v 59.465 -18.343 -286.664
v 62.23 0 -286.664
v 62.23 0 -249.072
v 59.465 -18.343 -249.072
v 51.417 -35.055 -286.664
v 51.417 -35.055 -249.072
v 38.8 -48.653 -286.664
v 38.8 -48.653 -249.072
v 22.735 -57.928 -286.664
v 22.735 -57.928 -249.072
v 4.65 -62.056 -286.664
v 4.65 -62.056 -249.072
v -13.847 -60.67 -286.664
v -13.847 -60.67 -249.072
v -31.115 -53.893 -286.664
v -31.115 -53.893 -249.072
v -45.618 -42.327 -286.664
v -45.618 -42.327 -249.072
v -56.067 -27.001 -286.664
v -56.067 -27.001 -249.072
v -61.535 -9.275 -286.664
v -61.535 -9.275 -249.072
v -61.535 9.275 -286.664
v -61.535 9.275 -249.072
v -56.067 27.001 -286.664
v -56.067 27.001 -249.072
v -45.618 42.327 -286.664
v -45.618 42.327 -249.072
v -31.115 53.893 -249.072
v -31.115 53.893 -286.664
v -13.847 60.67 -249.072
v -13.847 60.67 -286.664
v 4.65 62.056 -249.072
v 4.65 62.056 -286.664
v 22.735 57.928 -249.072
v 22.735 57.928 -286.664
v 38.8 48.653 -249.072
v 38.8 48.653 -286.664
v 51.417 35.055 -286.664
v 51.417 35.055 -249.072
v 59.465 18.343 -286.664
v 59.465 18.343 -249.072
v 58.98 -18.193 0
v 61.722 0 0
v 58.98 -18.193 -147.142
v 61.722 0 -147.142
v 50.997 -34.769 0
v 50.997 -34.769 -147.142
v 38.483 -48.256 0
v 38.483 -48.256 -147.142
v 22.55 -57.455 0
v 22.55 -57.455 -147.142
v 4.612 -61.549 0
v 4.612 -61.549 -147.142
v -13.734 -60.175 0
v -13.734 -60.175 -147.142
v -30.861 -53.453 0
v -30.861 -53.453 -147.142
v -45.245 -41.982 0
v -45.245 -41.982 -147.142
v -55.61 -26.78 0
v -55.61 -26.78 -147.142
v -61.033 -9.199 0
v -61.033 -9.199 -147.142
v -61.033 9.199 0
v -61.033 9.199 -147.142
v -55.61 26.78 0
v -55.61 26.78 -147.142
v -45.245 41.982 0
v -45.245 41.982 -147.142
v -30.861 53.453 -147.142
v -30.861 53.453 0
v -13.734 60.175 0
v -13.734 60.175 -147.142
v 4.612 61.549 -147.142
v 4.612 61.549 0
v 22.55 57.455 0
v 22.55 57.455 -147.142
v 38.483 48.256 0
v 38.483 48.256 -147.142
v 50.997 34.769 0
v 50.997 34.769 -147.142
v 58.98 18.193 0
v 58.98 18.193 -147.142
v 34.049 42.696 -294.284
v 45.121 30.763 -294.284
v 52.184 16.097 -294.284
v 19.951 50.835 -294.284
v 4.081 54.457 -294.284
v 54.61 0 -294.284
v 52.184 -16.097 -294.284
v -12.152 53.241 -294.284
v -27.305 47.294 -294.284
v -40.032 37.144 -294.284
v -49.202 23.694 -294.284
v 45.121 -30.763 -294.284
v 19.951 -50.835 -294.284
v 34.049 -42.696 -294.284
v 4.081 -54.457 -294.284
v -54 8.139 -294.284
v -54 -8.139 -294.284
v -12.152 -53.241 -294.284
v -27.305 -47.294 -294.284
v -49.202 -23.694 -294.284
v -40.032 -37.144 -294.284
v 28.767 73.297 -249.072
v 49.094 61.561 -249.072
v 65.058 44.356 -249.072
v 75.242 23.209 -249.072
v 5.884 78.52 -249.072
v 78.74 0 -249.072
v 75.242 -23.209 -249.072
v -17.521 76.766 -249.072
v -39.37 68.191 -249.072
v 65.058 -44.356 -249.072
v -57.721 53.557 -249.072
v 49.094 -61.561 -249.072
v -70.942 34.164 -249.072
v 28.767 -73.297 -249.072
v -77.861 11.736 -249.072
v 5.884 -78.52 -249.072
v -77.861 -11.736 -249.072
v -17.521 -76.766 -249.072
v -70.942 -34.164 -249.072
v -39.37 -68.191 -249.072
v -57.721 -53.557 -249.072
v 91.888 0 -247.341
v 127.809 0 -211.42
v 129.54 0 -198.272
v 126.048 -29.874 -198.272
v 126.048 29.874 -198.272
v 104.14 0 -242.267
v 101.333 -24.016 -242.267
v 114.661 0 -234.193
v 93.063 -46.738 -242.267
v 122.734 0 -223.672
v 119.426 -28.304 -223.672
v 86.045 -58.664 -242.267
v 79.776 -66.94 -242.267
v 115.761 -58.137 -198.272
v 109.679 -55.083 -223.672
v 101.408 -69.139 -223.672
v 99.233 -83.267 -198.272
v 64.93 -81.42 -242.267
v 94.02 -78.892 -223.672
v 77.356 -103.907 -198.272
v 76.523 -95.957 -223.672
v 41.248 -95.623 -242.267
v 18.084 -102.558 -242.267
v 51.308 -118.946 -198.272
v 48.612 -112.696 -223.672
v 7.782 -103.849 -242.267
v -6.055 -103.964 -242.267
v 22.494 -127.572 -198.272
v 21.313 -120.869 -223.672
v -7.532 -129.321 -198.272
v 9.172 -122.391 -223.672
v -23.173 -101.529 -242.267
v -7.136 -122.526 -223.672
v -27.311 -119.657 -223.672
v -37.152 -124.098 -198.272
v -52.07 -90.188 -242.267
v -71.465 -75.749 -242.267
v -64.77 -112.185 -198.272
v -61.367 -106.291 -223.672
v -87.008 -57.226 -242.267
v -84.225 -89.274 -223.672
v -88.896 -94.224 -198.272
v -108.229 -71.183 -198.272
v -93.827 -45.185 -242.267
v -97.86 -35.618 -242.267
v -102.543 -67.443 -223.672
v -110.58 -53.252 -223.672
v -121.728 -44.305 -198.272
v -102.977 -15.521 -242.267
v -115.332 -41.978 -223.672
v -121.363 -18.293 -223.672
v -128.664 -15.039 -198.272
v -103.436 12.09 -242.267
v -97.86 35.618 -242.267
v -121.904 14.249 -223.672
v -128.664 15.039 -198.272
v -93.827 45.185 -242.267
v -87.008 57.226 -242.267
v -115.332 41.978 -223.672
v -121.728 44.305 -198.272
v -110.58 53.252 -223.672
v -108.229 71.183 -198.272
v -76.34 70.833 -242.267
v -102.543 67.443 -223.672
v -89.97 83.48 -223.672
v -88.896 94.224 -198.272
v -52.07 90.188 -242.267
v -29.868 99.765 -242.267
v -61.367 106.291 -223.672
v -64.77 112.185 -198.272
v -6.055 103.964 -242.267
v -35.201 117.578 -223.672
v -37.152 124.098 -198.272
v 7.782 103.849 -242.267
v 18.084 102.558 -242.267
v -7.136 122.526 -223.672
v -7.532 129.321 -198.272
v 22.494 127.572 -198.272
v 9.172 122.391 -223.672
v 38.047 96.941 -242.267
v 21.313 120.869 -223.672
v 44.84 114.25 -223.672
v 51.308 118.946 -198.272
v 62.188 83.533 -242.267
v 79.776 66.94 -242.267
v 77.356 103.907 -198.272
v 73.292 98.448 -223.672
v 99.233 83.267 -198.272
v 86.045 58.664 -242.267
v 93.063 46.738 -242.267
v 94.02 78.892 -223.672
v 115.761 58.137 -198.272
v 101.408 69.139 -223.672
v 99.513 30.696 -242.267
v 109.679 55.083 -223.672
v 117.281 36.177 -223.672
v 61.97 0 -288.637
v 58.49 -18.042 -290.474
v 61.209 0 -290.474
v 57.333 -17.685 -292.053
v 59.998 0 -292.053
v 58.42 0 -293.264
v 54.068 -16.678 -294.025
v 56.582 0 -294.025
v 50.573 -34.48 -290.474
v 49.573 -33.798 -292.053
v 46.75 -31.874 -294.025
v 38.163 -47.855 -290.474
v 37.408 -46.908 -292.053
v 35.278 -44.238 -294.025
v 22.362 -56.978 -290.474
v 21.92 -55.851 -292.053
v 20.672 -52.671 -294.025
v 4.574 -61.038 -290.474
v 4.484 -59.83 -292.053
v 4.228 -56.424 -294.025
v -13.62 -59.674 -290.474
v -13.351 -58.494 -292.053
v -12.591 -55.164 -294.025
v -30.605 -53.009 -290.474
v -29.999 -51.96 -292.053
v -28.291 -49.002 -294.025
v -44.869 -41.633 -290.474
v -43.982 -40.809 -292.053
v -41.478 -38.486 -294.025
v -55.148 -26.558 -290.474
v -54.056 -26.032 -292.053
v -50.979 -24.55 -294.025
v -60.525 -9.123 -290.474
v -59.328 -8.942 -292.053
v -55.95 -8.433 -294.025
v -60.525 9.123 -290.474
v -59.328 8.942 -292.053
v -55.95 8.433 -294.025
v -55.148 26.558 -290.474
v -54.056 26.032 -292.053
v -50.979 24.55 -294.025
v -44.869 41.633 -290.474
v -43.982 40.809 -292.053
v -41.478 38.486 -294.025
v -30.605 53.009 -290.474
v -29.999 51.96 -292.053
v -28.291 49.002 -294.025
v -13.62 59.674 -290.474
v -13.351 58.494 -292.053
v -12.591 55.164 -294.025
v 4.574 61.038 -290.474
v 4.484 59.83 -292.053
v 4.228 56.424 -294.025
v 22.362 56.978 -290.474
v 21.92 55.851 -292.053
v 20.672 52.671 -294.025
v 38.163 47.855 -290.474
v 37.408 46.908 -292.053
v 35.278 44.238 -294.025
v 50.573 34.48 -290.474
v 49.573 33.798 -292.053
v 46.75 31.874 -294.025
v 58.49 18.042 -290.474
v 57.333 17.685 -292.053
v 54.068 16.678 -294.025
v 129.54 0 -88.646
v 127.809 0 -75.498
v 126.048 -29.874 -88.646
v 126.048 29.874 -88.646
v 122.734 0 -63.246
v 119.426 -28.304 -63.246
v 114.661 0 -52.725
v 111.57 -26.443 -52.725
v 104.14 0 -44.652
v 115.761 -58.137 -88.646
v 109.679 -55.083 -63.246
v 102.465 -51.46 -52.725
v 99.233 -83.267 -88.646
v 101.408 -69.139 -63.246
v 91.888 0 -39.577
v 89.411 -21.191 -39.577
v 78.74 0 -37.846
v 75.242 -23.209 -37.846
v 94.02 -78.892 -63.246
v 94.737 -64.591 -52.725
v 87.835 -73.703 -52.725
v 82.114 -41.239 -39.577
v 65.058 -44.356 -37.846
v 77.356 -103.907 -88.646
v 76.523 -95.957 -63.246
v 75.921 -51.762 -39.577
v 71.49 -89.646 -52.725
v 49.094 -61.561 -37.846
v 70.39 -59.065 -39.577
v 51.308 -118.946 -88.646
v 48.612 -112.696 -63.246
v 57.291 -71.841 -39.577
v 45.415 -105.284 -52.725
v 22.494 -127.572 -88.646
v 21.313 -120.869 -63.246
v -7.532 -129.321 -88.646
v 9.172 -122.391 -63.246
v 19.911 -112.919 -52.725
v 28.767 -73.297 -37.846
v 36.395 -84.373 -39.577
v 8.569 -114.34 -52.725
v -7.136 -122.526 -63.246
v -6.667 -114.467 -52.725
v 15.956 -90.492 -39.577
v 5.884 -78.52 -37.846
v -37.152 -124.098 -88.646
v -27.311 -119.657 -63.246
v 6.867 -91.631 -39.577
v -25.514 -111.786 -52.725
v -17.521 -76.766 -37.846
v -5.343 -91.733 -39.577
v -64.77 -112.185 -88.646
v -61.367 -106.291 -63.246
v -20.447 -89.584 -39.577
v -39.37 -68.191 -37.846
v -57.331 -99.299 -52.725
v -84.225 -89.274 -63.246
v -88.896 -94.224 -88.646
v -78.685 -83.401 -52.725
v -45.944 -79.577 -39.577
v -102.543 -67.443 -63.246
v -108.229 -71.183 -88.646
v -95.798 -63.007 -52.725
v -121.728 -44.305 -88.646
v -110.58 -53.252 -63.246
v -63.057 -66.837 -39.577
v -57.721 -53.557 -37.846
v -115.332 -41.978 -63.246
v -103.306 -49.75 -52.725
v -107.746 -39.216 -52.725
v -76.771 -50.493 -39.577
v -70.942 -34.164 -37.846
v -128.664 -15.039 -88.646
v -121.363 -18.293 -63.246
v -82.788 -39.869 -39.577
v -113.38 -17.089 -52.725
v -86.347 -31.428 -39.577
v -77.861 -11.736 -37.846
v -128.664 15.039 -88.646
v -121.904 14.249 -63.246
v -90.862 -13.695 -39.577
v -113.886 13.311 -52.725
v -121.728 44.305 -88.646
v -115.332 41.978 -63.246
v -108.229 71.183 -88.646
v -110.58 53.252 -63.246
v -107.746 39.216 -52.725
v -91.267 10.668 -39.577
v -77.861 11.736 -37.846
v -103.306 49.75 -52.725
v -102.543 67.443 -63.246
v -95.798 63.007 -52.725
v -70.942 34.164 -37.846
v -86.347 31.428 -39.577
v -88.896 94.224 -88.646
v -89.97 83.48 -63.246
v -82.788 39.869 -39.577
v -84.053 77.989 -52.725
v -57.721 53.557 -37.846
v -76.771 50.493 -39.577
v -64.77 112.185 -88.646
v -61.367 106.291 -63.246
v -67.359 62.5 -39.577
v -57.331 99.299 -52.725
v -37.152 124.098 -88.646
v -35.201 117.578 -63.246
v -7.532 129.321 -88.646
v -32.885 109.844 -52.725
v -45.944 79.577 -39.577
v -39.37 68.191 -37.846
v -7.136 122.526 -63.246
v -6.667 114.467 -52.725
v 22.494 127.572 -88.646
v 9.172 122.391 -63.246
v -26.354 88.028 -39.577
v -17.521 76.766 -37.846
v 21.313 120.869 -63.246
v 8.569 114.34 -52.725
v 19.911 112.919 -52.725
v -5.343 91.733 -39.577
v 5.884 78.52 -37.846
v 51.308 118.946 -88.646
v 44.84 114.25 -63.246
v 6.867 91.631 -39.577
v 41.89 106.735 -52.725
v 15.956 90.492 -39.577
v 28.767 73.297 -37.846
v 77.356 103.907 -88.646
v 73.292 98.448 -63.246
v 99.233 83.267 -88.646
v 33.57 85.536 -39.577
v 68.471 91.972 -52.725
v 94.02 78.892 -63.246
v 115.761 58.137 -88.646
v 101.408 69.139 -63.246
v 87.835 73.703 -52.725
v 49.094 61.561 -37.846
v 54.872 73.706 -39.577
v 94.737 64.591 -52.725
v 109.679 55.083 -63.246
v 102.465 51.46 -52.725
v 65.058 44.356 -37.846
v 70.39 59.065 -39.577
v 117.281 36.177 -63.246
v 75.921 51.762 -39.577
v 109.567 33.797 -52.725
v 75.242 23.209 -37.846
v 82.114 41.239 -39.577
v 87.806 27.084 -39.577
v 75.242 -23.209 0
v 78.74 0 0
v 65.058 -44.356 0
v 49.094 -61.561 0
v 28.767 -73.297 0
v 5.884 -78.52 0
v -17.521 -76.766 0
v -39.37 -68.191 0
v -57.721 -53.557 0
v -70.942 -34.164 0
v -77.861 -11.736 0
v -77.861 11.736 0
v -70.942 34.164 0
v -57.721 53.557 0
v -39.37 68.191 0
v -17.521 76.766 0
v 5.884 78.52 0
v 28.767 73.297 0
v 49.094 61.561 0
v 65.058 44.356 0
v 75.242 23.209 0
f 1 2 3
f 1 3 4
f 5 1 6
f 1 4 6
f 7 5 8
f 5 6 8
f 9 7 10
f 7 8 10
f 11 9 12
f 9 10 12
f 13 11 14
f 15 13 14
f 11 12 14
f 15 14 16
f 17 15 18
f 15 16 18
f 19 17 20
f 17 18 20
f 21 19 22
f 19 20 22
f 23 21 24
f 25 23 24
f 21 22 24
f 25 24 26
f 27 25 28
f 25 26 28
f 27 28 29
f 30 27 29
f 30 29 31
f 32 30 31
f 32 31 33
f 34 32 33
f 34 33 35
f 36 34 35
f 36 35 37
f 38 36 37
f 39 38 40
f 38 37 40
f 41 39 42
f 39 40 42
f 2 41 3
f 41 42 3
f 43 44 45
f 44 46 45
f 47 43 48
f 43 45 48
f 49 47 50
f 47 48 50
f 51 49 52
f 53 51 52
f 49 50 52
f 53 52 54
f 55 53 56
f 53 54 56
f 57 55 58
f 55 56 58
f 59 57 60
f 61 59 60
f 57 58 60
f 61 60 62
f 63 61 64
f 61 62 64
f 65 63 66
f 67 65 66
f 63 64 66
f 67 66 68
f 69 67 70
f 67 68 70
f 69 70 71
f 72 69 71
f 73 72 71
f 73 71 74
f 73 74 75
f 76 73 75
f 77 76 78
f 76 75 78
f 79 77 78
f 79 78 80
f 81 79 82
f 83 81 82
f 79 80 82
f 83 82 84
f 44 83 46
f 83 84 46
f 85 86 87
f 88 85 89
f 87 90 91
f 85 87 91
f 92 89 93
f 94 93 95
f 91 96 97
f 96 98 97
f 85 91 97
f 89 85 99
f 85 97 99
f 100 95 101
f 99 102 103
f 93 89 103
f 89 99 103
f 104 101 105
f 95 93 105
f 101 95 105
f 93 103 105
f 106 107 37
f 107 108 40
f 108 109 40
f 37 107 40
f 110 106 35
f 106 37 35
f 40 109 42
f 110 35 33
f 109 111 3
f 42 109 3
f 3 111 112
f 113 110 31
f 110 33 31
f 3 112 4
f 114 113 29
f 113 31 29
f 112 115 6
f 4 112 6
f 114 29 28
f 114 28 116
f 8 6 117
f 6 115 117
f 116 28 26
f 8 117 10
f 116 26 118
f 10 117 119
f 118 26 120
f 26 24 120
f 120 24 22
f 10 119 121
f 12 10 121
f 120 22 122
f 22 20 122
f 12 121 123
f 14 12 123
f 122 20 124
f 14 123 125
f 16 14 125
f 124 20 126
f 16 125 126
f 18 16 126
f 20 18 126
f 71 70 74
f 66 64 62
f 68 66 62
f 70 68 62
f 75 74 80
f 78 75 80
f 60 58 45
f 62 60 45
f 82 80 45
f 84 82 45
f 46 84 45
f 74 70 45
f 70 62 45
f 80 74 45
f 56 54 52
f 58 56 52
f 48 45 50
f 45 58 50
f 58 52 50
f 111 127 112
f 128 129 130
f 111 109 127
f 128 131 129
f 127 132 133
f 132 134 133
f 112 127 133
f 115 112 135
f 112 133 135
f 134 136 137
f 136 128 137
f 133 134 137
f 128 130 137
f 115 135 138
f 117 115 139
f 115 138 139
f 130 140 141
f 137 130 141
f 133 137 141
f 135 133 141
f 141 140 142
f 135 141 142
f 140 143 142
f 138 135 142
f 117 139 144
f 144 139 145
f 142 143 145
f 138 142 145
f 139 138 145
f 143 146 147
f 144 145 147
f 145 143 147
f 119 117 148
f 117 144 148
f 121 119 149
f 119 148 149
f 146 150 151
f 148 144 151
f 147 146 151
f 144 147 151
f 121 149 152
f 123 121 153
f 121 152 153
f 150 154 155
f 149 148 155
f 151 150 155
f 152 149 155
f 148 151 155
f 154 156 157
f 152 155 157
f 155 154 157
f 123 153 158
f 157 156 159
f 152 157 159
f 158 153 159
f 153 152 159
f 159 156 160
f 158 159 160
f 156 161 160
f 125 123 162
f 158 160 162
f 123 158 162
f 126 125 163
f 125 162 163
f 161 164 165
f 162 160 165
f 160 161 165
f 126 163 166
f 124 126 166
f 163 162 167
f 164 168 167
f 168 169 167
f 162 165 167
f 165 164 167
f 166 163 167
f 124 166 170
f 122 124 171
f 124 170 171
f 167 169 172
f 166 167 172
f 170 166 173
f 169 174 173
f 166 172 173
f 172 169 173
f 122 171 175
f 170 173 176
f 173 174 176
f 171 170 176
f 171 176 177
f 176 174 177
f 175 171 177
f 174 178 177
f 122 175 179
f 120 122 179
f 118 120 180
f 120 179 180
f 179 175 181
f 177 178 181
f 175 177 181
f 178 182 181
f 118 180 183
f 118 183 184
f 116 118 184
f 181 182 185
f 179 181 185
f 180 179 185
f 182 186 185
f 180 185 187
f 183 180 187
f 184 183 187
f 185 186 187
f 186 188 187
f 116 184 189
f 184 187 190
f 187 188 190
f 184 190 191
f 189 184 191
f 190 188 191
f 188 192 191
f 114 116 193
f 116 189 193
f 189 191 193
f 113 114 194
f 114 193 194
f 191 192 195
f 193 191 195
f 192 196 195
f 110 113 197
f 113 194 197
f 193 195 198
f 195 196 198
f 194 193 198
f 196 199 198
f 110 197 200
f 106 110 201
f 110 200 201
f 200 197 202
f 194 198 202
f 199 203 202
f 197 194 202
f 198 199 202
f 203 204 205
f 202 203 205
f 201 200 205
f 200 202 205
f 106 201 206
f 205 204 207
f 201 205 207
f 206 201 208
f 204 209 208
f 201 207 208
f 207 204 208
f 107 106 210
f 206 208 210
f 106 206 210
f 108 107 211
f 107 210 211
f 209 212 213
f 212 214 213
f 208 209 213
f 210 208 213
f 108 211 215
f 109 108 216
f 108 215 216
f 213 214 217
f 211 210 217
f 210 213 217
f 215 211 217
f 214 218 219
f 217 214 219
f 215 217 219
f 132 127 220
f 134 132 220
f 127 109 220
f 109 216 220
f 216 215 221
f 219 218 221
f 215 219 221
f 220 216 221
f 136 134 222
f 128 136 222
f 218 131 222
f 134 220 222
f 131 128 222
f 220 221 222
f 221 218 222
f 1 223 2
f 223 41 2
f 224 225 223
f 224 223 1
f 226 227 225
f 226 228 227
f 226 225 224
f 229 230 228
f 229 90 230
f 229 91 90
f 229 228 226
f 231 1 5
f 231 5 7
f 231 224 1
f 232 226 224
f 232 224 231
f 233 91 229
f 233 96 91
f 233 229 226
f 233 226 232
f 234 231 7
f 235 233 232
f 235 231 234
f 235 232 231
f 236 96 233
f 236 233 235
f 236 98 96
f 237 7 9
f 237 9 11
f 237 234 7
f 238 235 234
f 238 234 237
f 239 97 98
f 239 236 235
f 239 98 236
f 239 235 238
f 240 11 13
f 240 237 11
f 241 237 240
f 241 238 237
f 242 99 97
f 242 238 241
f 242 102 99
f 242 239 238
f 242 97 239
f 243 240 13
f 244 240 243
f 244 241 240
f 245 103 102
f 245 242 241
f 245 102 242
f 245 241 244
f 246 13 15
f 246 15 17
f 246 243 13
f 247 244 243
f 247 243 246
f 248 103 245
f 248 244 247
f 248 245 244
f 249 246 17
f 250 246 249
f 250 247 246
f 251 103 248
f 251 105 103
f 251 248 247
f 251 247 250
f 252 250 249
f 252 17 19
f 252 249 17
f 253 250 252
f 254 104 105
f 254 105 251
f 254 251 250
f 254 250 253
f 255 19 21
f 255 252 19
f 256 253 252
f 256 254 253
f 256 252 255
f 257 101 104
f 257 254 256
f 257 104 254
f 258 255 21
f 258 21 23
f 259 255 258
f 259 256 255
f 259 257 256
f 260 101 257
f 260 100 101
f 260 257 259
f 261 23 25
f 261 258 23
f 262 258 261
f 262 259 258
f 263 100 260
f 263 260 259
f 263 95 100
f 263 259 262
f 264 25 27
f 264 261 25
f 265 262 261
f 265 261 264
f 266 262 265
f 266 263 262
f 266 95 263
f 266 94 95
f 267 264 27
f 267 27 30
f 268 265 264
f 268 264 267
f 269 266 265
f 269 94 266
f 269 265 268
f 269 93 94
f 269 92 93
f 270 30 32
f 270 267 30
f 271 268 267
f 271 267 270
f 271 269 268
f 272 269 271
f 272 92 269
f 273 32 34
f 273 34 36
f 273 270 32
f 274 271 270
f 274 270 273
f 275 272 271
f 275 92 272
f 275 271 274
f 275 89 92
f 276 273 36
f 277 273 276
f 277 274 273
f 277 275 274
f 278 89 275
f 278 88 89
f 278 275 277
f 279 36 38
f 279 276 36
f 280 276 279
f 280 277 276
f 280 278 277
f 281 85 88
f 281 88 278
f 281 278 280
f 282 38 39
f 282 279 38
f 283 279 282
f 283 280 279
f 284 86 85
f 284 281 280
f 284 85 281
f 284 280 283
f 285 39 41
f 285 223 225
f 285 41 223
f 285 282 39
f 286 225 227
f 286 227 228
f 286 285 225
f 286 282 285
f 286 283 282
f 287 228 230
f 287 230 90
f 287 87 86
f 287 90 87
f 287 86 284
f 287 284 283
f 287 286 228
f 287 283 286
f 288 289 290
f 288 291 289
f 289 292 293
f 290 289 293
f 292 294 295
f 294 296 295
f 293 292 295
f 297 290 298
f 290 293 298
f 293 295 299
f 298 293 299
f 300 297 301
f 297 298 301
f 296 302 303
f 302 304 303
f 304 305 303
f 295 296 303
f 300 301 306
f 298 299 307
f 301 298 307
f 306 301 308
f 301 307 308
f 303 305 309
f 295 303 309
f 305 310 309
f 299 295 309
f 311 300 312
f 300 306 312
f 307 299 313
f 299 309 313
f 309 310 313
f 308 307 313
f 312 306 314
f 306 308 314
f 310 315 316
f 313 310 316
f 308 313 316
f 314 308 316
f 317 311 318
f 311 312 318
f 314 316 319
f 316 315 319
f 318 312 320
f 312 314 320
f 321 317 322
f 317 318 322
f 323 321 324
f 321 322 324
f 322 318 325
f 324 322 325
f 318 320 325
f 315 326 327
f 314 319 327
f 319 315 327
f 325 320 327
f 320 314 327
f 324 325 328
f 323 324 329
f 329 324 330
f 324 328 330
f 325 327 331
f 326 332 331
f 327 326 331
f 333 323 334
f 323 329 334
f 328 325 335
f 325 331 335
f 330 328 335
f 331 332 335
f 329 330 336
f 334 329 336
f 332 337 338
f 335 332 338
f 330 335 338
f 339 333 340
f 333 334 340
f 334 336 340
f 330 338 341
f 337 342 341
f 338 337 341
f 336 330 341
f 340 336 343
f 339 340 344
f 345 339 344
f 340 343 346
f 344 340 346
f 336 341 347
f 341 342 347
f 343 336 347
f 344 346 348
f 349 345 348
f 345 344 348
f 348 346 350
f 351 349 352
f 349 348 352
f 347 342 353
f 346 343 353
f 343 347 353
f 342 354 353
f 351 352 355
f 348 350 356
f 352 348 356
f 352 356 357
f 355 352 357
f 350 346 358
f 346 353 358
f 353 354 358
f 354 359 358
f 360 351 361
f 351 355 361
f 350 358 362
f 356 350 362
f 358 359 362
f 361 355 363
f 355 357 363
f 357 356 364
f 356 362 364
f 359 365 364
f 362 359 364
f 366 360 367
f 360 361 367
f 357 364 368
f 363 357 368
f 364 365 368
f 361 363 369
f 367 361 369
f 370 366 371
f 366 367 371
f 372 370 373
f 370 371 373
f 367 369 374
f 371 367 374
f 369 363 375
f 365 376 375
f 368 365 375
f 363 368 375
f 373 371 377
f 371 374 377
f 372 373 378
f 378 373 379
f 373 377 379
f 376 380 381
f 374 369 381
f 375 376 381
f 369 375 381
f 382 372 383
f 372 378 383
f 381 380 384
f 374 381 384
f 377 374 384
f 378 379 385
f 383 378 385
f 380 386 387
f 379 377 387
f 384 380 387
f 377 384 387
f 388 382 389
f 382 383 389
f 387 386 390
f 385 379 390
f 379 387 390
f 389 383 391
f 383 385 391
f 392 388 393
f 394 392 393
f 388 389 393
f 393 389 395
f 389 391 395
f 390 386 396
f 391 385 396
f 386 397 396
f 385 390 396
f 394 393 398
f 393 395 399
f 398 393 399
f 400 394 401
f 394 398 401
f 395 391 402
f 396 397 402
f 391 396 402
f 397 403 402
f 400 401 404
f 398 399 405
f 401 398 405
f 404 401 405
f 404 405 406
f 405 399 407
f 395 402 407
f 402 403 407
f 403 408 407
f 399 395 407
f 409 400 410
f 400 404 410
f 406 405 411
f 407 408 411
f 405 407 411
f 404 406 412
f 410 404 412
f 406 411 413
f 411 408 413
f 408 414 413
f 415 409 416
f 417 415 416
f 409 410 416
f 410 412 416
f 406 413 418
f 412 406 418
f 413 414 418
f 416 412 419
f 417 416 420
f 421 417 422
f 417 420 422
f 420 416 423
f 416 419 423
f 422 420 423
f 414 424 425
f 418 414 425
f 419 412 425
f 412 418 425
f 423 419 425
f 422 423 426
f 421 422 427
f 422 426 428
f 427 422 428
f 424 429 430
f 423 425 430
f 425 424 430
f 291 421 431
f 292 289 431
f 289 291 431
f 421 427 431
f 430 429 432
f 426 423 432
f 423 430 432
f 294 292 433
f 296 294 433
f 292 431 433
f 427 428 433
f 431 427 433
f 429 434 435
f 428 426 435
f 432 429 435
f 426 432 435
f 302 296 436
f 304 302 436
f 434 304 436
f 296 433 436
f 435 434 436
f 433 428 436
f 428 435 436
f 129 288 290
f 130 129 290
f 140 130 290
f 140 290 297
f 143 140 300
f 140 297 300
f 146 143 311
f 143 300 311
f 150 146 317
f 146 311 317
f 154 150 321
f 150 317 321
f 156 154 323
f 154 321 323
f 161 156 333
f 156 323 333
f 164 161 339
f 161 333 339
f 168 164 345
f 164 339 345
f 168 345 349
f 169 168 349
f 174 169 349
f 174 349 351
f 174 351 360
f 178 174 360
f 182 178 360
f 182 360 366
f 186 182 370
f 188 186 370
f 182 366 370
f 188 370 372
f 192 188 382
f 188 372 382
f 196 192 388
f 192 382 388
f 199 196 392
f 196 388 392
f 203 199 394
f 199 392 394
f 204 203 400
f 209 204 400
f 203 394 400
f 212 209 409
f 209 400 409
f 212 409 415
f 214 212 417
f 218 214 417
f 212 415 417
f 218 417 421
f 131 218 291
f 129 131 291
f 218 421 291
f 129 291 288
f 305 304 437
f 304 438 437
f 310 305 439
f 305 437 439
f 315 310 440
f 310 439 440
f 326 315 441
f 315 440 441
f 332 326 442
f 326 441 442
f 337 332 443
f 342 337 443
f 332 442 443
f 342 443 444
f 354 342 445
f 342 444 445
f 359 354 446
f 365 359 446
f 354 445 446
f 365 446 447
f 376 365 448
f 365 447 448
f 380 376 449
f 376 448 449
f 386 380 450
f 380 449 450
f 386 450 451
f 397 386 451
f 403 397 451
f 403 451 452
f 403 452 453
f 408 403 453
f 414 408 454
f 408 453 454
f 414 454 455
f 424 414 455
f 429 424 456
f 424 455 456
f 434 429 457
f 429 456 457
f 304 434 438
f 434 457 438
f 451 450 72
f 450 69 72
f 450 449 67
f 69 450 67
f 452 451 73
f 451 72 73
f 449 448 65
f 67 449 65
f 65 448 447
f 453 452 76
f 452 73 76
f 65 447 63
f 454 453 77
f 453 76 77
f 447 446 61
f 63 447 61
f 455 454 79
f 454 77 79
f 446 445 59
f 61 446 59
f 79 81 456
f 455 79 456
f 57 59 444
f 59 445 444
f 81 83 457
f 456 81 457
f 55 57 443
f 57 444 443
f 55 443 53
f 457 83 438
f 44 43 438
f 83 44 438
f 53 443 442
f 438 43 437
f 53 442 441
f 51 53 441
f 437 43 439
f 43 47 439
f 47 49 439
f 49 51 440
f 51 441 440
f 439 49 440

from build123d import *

# Parameters (mm, degrees)
FILLET2_R = 50.8
FILLET3_R = 7.62


with BuildPart() as part:
    # Sketch1 → Revolve1 (revolve)
    with BuildSketch(Plane(origin=(0, 0, 0), x_dir=(1, 0, 0), z_dir=(0, 1, 0)), mode=Mode.PRIVATE) as revolve1_sk:
        Polygon((-78.74, 0), (-61.722, 0), (-61.722, 147.1422), (0, 147.1422), (0, 294.2844), (-62.23, 294.2844), (-62.23, 249.0724), (-129.54, 249.0724), (-129.54, 37.846), (-78.74, 37.846), align=None)
    revolve(revolve1_sk.sketch.rotate(Axis((0, 0, 0), (0, 0, -1)), 180), axis=Axis((0, 0, 0), (0, 0, -1)))

    # Fillet2
    fillet2_edges = [part.edges().sort_by_distance(p)[0] for p in [
        (-129.54, 0, -37.846),
        (-129.54, 0, -249.0724),
    ]]
    fillet(fillet2_edges, radius=FILLET2_R - 0.0001)  # a hair under: the kernel refuses the full size

    # Fillet3
    fillet3_edges = [part.edges().sort_by_distance(p)[0] for p in [
        (-62.23, 0, -294.2844),
    ]]
    fillet(fillet3_edges, radius=FILLET3_R)


solid = part.part
